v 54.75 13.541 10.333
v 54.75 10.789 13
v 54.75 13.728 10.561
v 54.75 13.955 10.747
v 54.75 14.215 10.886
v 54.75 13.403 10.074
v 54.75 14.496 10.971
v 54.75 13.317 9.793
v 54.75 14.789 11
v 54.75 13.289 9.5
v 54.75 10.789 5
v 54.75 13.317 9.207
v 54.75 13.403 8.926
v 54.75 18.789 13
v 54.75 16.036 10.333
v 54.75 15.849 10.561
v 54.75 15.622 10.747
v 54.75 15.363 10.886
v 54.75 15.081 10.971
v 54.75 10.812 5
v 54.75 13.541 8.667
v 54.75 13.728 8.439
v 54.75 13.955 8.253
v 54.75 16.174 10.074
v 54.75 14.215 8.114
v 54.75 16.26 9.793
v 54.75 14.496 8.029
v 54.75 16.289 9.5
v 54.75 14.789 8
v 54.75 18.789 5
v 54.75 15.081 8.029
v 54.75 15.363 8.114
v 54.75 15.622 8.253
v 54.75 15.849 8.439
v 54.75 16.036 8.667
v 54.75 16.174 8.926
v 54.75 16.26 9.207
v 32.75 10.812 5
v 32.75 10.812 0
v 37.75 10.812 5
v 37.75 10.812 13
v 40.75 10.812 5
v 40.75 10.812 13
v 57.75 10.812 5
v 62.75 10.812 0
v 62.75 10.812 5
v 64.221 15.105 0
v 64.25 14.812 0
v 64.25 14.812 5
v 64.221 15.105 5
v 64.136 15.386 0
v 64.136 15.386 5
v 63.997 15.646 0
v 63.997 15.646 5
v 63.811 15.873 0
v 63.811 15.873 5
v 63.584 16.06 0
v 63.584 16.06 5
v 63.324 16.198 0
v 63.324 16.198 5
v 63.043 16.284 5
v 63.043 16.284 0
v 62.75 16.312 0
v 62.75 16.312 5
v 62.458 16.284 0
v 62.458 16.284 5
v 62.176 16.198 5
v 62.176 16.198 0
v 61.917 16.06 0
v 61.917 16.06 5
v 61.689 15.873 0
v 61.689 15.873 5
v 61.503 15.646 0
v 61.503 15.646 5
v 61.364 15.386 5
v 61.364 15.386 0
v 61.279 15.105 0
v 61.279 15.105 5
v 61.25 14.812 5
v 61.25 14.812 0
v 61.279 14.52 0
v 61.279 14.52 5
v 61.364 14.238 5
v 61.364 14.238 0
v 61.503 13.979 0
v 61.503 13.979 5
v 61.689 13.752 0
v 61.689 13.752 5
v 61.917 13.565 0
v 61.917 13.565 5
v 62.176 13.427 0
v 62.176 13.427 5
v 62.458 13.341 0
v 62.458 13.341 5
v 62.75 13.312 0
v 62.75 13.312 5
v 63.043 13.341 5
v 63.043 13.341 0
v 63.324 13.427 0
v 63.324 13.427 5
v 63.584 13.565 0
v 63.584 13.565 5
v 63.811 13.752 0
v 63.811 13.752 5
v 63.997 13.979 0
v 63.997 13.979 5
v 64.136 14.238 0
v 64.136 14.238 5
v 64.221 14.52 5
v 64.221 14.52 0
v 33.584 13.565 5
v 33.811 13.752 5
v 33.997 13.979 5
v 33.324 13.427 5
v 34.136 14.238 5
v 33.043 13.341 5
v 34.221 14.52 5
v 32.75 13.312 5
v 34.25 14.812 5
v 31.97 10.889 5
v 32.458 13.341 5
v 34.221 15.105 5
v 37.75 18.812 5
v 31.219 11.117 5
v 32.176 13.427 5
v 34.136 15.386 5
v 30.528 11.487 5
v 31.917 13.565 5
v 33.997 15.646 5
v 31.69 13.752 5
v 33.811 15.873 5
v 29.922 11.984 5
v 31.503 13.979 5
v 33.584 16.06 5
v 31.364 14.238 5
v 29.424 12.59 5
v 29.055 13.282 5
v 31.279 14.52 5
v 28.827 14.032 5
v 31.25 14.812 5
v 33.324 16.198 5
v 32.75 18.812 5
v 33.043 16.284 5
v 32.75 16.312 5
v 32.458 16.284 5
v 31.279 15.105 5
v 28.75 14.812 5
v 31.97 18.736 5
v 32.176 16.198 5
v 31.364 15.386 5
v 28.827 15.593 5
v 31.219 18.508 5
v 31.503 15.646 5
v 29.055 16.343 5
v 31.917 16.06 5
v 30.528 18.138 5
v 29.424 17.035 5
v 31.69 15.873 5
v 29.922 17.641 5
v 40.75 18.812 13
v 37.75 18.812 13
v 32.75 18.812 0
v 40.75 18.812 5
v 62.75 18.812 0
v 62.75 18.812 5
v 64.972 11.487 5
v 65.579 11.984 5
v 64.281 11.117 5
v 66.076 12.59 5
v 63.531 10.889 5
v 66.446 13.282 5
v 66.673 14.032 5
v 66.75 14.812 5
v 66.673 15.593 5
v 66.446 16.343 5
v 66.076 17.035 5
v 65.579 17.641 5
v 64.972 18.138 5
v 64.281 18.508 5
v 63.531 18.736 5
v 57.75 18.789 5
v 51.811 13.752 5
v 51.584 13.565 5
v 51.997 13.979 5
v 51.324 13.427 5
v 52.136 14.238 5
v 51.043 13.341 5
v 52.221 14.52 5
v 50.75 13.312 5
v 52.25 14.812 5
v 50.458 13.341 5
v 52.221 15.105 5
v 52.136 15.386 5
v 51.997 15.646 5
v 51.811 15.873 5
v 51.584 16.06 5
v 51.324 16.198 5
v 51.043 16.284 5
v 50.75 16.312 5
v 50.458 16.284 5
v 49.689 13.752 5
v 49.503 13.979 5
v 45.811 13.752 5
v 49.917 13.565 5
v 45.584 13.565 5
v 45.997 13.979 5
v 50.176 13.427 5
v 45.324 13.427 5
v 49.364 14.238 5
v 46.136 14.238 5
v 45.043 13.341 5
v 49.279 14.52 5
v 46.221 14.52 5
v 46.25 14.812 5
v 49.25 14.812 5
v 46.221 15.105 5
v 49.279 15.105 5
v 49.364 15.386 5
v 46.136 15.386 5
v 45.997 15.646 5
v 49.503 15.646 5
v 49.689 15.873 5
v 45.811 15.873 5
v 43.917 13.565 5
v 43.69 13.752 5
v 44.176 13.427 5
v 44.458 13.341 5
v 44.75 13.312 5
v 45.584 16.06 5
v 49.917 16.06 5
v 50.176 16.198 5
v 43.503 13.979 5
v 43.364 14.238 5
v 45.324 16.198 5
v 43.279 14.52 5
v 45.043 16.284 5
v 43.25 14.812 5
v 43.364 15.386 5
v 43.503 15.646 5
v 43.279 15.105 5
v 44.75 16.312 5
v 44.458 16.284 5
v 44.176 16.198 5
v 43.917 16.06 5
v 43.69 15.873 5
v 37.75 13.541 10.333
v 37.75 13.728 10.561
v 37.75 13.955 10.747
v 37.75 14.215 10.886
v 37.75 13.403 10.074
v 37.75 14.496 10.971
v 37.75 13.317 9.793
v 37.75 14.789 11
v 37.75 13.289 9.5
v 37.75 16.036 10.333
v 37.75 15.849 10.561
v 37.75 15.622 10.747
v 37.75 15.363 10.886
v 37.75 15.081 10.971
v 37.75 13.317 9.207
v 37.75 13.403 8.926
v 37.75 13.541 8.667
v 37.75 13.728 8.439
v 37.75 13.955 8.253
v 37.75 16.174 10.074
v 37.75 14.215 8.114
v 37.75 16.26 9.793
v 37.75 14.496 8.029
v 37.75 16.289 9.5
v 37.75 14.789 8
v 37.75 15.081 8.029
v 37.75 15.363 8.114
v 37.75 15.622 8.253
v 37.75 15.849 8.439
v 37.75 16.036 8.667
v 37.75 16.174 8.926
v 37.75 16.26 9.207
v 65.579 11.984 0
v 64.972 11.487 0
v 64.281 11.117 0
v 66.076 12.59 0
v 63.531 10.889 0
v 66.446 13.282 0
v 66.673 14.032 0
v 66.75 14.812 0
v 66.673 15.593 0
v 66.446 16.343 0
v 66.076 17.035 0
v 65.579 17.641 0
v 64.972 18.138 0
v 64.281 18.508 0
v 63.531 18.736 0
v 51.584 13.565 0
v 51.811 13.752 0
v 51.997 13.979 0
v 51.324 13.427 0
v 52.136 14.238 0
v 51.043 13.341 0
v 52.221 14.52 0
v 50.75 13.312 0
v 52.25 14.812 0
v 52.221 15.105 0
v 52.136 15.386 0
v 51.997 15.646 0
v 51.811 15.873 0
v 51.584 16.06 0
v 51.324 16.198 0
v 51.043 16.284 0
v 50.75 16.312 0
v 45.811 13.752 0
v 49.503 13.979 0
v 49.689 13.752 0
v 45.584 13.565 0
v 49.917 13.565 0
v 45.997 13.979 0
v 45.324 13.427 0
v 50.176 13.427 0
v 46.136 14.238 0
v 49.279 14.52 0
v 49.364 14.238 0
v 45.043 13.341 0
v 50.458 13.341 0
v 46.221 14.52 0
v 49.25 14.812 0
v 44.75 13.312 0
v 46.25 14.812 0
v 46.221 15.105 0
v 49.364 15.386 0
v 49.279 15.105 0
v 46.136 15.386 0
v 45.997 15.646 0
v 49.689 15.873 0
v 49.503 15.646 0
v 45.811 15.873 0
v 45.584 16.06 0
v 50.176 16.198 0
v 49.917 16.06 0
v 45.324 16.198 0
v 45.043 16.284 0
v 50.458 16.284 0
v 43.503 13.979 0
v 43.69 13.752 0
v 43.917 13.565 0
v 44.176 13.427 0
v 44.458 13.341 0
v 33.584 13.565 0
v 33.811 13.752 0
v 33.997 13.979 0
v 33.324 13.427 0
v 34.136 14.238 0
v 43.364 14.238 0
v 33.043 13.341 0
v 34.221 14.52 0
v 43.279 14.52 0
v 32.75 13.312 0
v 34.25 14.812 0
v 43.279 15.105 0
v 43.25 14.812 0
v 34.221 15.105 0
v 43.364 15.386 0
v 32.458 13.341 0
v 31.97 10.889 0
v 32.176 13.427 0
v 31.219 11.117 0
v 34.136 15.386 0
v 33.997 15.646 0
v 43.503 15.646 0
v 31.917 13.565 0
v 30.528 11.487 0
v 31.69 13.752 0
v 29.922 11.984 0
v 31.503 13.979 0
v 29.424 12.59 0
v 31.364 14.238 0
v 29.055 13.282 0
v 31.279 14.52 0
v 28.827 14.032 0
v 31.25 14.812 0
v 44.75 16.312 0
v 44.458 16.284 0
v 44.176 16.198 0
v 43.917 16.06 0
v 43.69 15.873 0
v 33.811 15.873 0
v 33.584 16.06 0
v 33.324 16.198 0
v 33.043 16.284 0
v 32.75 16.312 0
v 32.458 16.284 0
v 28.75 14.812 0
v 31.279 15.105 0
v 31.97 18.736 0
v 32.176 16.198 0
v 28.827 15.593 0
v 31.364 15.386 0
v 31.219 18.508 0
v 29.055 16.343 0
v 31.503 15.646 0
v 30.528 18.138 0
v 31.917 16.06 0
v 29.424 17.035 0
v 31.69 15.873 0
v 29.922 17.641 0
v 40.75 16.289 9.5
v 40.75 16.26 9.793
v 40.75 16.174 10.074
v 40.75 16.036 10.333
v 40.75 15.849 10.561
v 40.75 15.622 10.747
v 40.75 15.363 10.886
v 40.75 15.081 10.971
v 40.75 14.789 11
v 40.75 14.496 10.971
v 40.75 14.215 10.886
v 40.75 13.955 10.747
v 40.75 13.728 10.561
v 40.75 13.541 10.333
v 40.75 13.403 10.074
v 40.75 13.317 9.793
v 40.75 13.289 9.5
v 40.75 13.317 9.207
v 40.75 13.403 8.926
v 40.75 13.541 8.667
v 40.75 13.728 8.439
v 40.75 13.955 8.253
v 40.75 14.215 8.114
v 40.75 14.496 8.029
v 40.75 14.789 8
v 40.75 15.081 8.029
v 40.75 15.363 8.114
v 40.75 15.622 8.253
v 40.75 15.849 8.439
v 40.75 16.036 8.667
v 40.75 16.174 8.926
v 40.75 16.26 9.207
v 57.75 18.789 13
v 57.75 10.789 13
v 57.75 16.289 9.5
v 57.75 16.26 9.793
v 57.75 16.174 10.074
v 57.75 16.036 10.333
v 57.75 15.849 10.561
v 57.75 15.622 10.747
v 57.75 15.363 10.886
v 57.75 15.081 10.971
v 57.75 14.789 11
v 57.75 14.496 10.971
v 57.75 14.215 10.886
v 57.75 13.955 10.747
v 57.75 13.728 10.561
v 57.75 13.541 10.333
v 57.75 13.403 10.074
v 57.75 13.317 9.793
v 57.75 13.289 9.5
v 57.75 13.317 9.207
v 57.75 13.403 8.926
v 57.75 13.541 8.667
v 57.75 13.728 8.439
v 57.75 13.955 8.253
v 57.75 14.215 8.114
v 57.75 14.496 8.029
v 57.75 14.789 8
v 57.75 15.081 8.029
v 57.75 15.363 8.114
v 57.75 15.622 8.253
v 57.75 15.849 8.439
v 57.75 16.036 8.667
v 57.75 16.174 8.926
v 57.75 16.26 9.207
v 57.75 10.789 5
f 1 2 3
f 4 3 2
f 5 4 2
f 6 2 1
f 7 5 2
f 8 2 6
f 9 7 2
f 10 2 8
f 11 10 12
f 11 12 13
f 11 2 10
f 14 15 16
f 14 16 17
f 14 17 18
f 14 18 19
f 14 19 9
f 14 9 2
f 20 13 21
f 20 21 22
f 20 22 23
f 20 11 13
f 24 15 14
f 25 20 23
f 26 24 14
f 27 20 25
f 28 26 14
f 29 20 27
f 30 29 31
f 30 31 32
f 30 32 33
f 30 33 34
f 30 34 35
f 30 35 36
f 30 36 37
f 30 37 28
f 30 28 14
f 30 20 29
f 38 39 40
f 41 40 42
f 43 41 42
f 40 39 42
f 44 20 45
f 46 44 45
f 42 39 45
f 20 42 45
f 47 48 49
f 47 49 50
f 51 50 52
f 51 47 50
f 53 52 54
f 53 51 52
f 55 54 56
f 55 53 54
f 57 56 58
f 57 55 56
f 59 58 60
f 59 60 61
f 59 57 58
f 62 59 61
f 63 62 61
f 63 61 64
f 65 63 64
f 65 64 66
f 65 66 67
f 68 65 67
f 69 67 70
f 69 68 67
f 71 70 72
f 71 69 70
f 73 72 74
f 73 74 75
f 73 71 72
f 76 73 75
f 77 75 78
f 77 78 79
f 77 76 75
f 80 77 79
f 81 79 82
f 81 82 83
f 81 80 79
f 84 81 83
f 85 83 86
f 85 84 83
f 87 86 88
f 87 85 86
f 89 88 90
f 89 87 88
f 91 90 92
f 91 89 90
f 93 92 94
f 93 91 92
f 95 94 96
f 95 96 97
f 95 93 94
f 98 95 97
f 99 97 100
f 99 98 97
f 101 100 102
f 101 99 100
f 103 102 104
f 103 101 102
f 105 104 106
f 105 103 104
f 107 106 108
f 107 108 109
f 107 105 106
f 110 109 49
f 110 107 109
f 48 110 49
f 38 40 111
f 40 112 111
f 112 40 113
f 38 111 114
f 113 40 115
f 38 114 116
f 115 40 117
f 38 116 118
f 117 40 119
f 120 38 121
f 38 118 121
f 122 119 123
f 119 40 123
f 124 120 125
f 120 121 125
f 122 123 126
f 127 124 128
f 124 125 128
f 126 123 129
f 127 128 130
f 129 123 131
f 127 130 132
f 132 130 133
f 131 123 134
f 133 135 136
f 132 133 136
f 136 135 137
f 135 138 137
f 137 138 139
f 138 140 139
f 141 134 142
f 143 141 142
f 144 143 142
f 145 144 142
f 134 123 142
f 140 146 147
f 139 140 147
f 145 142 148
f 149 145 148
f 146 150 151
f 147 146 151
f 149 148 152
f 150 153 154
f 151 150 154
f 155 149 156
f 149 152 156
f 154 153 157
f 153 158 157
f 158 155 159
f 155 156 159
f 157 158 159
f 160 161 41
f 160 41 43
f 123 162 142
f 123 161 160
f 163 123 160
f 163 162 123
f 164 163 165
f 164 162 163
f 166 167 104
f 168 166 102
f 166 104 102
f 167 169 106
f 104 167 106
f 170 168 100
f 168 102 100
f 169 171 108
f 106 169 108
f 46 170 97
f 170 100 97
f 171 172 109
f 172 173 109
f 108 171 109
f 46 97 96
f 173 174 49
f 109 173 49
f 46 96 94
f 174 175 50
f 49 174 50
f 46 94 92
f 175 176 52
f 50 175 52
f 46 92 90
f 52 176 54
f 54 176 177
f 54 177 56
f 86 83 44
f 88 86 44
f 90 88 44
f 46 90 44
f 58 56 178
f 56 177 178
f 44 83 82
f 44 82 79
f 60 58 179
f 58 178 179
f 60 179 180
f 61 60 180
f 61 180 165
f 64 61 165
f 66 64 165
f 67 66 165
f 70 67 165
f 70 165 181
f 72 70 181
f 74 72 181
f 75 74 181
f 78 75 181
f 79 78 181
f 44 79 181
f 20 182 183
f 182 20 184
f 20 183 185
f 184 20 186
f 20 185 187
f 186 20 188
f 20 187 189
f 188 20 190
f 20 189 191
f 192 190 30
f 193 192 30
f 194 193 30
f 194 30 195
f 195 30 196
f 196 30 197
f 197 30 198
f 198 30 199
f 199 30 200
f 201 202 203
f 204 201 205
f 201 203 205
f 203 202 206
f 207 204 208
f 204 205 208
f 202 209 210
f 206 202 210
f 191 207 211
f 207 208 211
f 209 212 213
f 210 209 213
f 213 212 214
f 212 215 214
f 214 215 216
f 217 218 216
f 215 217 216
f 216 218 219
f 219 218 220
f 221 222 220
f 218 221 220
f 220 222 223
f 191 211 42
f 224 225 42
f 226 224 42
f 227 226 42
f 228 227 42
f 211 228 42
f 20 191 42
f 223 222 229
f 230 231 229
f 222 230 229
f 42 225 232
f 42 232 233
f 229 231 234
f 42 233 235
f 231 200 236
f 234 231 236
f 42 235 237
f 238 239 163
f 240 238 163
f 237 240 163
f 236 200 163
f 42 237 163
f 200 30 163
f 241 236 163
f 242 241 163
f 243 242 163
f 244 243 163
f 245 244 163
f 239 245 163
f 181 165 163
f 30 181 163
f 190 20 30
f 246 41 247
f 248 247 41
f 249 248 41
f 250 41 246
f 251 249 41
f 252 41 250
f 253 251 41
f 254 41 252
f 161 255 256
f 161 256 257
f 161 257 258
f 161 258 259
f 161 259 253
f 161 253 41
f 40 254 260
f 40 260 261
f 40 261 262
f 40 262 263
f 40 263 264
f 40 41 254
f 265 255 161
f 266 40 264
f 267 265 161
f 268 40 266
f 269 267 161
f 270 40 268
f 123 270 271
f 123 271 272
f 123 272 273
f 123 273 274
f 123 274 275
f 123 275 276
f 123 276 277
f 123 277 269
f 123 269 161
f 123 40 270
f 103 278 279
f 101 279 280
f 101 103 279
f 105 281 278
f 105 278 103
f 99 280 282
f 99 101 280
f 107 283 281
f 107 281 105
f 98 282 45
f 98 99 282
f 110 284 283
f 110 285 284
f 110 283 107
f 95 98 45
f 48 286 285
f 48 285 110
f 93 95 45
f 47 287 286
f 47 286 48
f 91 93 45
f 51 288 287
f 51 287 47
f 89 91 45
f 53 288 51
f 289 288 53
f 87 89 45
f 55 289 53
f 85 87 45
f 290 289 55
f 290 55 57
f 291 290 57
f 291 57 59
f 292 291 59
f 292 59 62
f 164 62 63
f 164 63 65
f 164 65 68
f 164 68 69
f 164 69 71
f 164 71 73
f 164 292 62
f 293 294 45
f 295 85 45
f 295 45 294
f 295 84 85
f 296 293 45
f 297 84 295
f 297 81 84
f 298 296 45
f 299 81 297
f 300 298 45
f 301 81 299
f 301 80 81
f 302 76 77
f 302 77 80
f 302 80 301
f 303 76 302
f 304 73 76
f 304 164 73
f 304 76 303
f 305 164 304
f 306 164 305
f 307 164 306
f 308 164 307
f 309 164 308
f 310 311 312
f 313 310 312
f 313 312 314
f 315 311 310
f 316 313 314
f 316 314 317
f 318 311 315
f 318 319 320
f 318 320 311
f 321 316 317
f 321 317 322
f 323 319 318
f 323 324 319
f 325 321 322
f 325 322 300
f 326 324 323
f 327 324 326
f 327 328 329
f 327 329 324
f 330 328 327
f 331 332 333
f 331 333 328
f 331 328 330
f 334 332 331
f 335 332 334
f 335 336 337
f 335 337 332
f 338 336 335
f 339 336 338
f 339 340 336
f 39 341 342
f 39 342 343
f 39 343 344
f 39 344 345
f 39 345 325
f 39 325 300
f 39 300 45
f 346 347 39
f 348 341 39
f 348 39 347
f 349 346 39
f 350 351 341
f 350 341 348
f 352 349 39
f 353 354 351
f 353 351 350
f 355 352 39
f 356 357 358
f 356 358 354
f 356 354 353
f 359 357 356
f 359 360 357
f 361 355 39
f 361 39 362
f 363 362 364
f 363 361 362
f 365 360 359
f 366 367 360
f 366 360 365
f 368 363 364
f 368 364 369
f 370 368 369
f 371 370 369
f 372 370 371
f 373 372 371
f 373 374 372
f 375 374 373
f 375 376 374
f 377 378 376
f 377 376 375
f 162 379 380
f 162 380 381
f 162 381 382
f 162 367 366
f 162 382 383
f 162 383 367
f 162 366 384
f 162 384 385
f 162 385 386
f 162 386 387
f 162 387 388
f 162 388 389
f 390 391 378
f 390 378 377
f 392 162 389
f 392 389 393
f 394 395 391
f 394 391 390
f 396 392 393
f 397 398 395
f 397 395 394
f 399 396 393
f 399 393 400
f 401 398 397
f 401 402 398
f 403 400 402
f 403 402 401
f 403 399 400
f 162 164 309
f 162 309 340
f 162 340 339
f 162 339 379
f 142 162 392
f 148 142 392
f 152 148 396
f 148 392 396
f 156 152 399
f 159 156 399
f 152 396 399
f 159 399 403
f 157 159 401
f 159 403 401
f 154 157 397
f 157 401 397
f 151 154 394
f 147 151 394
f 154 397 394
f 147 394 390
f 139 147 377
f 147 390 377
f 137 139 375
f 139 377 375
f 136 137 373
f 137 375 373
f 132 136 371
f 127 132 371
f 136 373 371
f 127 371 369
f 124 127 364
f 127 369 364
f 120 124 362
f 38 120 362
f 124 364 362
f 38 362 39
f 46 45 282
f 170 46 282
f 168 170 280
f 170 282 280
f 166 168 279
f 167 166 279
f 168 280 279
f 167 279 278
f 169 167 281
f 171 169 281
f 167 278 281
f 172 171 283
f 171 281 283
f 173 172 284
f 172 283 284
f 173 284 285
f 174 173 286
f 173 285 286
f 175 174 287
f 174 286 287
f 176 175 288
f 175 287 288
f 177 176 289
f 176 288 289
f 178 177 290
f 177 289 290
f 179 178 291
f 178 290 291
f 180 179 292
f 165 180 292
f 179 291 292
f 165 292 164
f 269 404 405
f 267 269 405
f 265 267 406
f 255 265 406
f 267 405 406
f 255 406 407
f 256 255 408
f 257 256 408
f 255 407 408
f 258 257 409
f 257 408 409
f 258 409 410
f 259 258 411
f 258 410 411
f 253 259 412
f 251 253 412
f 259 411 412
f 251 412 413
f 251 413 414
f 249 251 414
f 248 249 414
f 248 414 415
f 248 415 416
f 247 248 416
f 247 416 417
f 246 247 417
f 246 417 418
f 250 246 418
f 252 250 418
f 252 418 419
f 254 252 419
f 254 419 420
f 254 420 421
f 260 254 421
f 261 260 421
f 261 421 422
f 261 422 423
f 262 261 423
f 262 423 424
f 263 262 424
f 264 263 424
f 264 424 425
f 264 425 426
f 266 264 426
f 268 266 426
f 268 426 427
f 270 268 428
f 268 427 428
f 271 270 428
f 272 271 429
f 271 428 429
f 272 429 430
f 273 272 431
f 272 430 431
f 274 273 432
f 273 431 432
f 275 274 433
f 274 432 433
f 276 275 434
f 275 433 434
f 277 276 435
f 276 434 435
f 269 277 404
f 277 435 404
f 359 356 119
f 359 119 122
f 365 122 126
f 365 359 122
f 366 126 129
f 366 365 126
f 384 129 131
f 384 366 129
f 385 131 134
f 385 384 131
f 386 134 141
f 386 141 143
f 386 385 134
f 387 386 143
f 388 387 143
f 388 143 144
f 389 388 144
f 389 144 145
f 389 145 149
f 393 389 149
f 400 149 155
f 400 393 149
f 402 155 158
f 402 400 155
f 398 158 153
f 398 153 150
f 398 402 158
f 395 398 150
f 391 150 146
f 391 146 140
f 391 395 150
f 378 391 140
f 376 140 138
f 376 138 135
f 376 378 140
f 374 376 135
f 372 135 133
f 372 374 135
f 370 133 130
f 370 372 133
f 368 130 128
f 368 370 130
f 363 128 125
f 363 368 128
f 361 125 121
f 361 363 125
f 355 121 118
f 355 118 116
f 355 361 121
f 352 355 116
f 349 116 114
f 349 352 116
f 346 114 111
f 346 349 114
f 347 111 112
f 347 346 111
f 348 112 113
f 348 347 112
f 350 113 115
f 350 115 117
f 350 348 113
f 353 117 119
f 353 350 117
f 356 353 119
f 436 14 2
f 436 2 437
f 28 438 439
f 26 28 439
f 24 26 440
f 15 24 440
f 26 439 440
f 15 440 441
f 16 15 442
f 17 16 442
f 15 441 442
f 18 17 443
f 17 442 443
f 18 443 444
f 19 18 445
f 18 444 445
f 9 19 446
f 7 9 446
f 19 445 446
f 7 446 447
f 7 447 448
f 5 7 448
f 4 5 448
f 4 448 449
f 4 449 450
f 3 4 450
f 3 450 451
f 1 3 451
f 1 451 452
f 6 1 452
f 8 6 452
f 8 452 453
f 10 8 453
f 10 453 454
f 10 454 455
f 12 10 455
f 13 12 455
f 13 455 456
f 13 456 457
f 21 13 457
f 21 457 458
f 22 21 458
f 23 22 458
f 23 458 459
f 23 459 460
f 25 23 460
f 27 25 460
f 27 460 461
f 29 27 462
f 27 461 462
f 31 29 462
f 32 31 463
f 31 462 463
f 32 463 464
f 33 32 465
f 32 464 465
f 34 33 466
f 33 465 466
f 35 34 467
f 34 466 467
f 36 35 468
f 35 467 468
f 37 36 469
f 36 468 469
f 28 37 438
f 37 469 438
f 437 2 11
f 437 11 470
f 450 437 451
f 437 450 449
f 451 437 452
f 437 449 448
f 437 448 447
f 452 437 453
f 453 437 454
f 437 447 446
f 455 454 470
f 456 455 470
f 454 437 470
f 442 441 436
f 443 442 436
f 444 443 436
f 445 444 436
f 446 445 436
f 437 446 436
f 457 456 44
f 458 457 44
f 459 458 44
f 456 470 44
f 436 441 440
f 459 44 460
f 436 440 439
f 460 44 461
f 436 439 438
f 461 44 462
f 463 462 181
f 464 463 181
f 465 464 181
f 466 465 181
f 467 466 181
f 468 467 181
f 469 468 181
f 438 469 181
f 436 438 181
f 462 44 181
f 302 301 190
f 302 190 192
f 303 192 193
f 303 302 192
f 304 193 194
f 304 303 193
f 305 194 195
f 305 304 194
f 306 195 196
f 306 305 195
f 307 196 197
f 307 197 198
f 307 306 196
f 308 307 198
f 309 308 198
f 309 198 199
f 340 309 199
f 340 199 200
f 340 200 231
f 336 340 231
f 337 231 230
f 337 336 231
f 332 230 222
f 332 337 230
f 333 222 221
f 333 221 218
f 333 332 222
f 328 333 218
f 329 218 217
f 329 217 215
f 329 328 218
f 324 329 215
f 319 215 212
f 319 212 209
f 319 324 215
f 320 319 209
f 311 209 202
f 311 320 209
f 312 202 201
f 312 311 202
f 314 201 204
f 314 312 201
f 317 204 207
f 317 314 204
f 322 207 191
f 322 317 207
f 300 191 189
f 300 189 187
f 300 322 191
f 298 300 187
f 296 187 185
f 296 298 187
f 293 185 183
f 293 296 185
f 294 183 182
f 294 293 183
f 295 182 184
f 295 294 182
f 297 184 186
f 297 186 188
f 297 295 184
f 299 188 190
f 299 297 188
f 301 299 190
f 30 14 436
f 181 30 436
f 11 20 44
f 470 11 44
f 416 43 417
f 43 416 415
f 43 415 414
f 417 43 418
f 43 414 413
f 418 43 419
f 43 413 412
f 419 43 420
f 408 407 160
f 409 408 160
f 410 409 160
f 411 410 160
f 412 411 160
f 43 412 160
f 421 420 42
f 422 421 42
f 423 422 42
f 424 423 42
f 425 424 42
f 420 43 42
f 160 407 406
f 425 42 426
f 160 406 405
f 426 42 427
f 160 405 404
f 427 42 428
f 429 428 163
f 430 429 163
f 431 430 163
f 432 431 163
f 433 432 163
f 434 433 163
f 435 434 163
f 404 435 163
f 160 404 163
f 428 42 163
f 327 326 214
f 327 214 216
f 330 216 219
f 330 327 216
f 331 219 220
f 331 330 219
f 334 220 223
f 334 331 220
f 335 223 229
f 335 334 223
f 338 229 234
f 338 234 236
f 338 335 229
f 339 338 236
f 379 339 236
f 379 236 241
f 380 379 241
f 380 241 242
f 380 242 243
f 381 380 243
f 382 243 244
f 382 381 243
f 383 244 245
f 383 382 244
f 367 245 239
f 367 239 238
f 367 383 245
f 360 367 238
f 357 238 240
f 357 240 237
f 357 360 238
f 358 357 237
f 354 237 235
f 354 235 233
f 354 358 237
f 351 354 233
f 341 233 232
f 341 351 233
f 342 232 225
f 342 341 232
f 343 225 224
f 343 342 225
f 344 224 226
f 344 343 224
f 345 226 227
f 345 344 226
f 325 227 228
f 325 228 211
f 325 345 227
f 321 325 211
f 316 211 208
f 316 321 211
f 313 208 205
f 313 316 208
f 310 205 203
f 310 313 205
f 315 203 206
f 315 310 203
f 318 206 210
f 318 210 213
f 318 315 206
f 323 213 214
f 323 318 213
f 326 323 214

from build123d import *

# Parameters (mm, degrees)
SKETCH_R     = 1.5
PAD_DEPTH    = 5
SKETCH001_W  = 3
SKETCH001_H  = 8
PAD001_DEPTH = 8
SKETCH002_R  = 1.5
POCKET_DEPTH = 23


with BuildPart() as part:
    # Sketch → Pad (new body)
    with BuildSketch(Plane.XY):
        with BuildLine():
            Line((32.750175, 18.812472), (62.750175, 18.812472))
            ThreePointArc((62.750169, 10.812472), (66.750155, 14.812469), (62.750175, 18.812472))
            Line((32.750169, 10.812472), (62.750169, 10.812472))
            ThreePointArc((32.750175, 18.812472), (28.750176, 14.812476), (32.750169, 10.812472))
        make_face()
        with Locations((32.750176, 14.812472)):
            Circle(SKETCH_R, mode=Mode.SUBTRACT)
        with Locations((62.750155, 14.812472)):
            Circle(SKETCH_R, mode=Mode.SUBTRACT)
        with Locations((50.750155, 14.812472)):
            Circle(SKETCH_R, mode=Mode.SUBTRACT)
        with Locations((44.750176, 14.812472)):
            Circle(SKETCH_R, mode=Mode.SUBTRACT)
    extrude(amount=PAD_DEPTH)

    # Sketch001 (on Face10 of Pad) → Pad001 (join)
    with BuildSketch(Plane.XY.offset(5)):
        with Locations((39.250176, 14.812472)):
            Rectangle(SKETCH001_W, SKETCH001_H)
        with Locations((56.250155, 14.788555)):
            Rectangle(SKETCH001_W, SKETCH001_H)
    extrude(amount=PAD001_DEPTH)

    # Sketch002 (on Face20 of Pad001) → Pocket (cut)
    with BuildSketch(Plane.YZ.offset(57.750155)):
        with Locations((14.788555, 9.5)):
            Circle(SKETCH002_R)
    extrude(amount=-POCKET_DEPTH, mode=Mode.SUBTRACT)


solid = part.part
